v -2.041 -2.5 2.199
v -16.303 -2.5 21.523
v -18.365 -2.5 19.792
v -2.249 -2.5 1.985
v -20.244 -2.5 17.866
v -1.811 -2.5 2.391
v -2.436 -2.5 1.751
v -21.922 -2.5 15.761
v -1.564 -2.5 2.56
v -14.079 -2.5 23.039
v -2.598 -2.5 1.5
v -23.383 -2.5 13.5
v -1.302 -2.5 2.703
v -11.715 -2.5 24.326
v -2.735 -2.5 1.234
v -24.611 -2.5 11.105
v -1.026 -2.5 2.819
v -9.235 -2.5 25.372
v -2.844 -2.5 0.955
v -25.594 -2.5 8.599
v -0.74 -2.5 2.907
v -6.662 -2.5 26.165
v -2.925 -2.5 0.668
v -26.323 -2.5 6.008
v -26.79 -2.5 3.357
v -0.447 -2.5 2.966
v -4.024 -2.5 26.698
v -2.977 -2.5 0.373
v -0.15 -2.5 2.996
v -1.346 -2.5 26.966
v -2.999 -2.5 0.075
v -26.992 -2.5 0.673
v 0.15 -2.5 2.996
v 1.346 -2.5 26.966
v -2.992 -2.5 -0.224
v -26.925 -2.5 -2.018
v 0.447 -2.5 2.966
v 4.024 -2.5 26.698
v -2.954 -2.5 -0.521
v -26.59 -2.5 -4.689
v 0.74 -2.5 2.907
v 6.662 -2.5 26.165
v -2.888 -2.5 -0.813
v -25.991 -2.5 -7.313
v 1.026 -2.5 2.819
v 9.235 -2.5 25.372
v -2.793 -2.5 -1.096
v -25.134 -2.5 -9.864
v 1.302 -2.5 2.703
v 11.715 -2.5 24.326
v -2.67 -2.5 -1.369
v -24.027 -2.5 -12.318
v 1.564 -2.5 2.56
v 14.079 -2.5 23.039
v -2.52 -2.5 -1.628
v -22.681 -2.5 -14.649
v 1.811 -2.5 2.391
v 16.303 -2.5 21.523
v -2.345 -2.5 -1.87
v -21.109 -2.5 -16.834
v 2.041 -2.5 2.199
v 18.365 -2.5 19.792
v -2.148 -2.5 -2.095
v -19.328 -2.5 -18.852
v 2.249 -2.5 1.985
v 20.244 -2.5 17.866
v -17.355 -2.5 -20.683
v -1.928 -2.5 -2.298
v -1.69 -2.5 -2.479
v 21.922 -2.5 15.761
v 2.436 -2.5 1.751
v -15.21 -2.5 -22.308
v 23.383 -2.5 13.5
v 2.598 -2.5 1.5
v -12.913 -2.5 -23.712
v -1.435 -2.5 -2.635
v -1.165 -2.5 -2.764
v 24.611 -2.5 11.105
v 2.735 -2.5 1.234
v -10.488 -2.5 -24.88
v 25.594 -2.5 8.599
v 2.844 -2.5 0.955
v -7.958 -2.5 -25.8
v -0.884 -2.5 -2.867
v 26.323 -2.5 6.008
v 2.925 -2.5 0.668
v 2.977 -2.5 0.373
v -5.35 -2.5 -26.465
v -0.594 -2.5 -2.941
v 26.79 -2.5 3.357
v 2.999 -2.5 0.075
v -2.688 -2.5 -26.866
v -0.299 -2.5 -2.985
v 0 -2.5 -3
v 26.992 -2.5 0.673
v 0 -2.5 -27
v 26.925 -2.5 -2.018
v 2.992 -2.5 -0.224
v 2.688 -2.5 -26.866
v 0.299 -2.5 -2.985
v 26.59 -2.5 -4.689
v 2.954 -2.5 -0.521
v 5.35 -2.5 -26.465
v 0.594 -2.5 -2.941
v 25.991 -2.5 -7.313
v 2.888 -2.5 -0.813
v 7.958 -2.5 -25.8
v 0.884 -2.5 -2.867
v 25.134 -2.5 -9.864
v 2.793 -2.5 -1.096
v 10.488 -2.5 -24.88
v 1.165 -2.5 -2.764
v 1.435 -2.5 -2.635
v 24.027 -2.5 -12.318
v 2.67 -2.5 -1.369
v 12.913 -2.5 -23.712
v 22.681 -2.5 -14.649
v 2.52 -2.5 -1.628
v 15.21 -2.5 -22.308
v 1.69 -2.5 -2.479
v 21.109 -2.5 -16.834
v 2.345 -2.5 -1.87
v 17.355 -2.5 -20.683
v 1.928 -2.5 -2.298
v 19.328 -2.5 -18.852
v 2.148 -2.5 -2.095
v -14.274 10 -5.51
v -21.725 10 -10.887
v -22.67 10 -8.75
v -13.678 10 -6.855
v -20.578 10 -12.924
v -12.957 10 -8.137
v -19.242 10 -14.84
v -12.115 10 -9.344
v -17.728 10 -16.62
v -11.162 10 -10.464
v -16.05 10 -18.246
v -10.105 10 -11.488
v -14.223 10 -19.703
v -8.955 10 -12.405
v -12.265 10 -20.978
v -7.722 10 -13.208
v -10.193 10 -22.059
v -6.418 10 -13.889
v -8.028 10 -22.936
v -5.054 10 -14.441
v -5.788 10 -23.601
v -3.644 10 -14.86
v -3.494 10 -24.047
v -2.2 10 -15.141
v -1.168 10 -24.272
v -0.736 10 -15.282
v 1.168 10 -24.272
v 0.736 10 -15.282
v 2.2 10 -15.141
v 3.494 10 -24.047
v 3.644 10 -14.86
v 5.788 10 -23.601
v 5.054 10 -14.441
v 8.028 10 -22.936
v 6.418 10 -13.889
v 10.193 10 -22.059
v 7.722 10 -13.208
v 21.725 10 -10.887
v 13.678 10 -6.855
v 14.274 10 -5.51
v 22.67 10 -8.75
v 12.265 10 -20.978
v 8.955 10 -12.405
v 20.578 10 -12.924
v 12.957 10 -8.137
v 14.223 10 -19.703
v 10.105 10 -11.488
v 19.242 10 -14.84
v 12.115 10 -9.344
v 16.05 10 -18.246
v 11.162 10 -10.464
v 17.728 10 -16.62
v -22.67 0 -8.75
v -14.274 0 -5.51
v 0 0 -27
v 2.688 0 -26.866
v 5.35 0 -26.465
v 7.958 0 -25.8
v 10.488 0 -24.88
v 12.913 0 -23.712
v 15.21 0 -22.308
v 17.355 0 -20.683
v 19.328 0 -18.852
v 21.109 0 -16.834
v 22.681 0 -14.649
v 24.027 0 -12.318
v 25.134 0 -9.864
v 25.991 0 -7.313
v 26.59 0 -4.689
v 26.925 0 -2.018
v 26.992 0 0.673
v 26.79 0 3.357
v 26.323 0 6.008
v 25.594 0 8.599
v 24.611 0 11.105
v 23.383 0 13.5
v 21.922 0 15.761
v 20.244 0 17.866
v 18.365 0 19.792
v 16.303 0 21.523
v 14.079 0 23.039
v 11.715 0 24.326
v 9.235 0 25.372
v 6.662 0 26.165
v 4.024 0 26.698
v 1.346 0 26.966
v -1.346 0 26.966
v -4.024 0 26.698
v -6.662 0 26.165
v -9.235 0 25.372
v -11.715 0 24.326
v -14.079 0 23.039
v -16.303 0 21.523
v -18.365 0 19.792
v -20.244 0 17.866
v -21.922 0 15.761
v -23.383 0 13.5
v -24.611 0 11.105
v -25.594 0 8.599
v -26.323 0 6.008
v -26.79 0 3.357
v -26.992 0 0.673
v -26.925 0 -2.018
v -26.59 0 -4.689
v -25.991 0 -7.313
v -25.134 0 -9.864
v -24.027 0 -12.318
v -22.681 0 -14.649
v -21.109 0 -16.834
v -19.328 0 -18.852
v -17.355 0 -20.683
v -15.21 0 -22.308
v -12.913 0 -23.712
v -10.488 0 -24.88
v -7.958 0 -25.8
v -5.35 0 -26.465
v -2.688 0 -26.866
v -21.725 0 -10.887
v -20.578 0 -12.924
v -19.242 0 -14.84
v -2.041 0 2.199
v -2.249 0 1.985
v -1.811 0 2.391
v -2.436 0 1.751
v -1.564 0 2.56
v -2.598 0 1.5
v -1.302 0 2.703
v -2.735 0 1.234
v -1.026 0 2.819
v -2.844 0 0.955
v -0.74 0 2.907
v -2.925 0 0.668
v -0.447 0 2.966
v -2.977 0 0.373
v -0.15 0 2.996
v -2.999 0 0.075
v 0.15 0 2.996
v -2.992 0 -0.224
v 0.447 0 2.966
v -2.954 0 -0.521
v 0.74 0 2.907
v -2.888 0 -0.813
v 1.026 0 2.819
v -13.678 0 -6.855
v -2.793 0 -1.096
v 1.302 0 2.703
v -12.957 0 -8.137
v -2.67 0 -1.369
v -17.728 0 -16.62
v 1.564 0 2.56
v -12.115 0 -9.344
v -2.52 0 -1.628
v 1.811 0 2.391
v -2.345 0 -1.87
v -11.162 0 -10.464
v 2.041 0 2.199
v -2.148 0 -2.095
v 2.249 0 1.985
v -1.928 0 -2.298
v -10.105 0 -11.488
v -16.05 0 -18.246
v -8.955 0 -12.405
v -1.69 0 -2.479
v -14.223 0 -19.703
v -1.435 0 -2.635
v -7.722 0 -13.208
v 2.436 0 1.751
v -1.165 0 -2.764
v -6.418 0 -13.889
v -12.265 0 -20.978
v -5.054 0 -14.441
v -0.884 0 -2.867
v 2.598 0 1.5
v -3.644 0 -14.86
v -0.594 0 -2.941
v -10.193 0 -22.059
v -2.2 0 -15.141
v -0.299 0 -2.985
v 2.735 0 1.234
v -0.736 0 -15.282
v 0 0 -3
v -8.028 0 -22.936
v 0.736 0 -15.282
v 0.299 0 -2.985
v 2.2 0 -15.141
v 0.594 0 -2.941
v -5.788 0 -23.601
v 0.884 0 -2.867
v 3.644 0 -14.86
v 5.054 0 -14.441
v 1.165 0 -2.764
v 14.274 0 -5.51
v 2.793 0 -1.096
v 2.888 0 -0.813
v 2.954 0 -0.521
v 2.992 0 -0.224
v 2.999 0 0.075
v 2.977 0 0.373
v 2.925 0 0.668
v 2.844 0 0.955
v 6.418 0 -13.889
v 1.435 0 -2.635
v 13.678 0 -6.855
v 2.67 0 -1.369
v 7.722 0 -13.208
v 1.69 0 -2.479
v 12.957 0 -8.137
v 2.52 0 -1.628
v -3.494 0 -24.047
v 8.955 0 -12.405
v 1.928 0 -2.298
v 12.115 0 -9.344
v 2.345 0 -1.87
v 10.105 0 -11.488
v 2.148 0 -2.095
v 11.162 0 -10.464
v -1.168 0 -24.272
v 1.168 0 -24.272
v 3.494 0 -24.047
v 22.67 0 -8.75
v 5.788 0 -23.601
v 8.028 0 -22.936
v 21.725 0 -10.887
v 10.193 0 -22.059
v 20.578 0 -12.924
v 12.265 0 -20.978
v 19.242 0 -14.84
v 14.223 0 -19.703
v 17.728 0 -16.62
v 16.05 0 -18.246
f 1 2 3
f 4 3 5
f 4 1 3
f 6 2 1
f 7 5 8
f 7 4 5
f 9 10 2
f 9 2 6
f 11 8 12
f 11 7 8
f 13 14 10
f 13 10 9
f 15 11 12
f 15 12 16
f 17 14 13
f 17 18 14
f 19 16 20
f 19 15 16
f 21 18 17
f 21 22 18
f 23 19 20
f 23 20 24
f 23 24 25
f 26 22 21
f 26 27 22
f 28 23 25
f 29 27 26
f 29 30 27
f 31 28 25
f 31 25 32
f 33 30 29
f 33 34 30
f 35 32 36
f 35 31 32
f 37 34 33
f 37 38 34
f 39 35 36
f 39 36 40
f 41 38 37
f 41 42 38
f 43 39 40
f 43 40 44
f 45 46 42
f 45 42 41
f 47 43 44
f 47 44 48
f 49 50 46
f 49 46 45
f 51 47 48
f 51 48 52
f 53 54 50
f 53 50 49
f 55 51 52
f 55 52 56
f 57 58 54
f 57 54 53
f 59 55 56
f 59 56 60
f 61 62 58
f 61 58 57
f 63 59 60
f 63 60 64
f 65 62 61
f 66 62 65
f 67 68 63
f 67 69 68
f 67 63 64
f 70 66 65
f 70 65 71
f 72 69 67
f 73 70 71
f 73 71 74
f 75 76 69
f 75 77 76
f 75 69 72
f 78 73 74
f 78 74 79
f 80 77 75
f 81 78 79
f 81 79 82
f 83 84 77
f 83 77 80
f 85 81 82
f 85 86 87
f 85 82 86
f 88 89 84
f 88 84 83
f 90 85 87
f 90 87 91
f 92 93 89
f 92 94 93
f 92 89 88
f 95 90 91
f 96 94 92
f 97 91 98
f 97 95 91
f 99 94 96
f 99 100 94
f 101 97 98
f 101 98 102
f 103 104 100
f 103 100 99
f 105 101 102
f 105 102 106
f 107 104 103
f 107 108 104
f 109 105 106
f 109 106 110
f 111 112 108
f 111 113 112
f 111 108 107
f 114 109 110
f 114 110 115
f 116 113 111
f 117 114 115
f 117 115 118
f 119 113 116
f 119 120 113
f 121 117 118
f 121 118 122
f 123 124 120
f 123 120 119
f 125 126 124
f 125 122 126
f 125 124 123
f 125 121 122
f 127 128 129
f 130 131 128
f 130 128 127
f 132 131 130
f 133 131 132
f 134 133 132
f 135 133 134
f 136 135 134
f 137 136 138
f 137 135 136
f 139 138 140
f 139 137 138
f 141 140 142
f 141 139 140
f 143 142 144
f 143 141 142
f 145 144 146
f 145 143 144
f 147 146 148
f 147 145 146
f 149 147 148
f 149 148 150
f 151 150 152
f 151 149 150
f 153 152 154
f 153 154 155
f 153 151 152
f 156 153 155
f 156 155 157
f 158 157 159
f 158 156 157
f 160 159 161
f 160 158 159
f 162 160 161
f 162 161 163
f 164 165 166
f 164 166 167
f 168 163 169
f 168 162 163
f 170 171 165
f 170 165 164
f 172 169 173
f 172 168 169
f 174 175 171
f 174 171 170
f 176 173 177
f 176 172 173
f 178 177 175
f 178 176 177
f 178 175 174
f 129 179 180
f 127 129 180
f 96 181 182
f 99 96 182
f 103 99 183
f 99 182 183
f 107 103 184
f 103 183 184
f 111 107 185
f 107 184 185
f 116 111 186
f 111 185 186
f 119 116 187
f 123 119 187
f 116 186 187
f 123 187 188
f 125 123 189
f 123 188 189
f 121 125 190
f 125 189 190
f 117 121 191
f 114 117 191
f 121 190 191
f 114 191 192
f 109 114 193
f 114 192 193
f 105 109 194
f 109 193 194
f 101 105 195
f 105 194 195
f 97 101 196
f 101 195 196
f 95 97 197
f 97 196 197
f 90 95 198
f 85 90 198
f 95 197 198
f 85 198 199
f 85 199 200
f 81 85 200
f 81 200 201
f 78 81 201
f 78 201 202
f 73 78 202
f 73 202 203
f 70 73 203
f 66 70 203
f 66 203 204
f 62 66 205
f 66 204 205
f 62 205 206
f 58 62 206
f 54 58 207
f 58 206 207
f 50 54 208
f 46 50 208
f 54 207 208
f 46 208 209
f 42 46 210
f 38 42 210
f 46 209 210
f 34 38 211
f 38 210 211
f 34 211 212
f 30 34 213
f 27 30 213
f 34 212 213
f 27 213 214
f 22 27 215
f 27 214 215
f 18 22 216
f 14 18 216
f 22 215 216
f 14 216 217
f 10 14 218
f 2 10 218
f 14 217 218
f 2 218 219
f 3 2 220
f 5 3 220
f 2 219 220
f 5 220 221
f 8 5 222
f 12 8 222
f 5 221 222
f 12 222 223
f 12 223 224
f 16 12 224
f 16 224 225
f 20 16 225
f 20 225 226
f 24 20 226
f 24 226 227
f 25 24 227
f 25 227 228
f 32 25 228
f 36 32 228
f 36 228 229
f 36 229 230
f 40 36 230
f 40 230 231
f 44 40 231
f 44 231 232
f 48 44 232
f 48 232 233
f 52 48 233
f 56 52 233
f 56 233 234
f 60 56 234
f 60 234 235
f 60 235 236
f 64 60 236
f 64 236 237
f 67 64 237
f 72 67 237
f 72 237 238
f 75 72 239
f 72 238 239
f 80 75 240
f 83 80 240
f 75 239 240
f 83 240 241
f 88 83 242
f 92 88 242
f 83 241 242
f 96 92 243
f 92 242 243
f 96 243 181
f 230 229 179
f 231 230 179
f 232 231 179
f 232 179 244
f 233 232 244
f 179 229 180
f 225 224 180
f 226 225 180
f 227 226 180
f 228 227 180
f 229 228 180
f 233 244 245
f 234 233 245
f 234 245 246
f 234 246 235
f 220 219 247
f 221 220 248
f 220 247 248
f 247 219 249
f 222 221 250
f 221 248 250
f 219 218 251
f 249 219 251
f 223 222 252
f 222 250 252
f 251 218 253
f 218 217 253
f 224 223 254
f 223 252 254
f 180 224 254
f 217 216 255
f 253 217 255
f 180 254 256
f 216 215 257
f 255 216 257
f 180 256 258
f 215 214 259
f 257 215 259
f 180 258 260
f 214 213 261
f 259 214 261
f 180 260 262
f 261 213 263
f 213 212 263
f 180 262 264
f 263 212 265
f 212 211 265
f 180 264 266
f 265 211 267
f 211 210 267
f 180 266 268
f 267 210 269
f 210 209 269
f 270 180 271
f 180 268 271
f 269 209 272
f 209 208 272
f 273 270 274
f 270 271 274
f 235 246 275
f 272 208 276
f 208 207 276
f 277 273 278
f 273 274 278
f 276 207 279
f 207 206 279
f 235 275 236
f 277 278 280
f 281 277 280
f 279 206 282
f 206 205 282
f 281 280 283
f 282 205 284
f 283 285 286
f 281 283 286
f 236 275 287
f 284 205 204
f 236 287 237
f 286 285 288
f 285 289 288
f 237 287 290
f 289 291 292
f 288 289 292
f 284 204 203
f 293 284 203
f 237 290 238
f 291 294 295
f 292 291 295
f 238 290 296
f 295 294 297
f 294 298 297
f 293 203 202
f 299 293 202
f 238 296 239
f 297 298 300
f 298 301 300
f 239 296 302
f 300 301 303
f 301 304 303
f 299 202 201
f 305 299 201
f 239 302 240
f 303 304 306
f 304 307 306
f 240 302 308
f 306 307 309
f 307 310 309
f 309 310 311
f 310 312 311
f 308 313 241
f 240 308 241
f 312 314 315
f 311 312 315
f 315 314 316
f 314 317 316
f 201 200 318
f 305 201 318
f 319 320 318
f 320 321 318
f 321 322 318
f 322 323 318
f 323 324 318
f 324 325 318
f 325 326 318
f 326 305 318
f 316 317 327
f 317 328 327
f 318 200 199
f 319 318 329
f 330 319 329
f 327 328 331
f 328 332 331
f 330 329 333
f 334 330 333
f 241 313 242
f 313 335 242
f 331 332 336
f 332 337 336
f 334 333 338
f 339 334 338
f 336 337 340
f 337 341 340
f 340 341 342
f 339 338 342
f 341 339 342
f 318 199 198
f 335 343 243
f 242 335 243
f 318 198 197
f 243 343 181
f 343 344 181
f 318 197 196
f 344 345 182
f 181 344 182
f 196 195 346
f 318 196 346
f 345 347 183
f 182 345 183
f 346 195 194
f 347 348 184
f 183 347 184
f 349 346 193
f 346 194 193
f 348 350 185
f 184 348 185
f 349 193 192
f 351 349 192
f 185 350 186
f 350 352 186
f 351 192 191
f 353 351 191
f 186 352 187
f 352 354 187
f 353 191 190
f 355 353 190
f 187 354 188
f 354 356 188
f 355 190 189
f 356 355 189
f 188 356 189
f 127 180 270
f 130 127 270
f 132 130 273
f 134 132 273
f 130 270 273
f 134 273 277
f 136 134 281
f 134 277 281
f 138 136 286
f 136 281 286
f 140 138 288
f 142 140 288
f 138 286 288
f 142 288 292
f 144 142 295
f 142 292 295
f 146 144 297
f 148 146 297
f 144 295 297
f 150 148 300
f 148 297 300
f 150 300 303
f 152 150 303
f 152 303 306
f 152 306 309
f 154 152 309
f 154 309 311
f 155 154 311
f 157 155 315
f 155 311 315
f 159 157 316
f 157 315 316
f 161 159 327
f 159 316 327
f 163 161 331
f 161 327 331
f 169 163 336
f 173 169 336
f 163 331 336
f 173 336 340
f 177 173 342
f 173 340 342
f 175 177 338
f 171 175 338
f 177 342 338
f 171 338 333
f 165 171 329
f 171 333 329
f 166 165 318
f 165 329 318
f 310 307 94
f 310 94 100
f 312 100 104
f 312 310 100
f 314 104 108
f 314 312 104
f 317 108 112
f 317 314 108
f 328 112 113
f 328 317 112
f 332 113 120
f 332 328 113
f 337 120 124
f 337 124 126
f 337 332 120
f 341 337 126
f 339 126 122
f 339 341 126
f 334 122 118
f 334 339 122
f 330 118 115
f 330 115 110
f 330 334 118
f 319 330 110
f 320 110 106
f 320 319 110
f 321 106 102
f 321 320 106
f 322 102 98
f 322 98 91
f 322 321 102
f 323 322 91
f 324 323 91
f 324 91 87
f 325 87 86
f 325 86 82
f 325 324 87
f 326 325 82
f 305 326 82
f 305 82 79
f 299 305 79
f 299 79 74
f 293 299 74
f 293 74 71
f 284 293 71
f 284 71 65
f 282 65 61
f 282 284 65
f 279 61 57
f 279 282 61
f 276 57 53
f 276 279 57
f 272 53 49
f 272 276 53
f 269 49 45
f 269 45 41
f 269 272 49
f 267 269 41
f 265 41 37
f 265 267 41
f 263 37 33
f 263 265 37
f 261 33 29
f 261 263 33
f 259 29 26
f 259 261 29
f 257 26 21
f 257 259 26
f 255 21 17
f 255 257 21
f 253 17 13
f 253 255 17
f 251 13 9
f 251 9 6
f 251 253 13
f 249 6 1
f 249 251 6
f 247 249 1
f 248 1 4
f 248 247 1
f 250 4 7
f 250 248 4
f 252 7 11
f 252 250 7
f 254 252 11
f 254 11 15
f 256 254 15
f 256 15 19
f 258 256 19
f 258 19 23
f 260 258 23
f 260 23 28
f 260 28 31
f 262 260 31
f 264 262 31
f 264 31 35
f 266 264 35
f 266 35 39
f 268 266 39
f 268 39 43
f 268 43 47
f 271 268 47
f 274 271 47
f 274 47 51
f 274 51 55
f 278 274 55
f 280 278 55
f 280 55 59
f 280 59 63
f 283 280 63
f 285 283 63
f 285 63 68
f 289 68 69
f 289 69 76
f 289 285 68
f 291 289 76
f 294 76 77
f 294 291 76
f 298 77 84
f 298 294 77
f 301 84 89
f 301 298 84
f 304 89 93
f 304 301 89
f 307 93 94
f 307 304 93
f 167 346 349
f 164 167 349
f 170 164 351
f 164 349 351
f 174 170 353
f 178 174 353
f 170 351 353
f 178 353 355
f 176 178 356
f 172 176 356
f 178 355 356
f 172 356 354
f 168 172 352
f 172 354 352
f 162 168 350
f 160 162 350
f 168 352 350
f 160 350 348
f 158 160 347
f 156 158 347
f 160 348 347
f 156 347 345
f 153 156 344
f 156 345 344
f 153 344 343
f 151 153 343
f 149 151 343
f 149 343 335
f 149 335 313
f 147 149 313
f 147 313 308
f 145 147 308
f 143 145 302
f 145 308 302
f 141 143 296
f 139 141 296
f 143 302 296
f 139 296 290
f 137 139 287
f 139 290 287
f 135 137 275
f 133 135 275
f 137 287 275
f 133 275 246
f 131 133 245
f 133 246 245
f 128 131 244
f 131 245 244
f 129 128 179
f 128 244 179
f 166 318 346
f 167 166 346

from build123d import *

# Parameters (mm, degrees)
BOSS_EXTRUDE1_DEPTH = 10
SKETCH2_R           = 27
SKETCH2_R_2         = 3
BOSS_EXTRUDE2_DEPTH = 2.5


with BuildPart() as part:
    # Sketch1 → Boss-Extrude1 (new body)
    with BuildSketch(Plane(origin=(0, 0, 0), x_dir=(1, 0, 0), z_dir=(0, 1, 0))):
        with BuildLine():
            Line((-22.669793675, 8.750454545), (-14.273573795, 5.509545455))
            ThreePointArc((-14.273573795, 5.509545455), (0, 15.3), (14.273573795, 5.509545455))
            Line((14.273573795, 5.509545455), (22.669793675, 8.750454545))
            ThreePointArc((22.669793675, 8.750454545), (0, 24.3), (-22.669793675, 8.750454545))
        make_face()
    extrude(amount=BOSS_EXTRUDE1_DEPTH)

    # Sketch2 → Boss-Extrude2 (add)
    with BuildSketch(Plane.XZ):
        with Locations(Location((0, 0, 0), (0, 0, 270))):
            Circle(SKETCH2_R)
        with Locations(Location((0, 0, 0), (0, 0, 270))):
            Circle(SKETCH2_R_2, mode=Mode.SUBTRACT)
    extrude(amount=BOSS_EXTRUDE2_DEPTH)


solid = part.part
